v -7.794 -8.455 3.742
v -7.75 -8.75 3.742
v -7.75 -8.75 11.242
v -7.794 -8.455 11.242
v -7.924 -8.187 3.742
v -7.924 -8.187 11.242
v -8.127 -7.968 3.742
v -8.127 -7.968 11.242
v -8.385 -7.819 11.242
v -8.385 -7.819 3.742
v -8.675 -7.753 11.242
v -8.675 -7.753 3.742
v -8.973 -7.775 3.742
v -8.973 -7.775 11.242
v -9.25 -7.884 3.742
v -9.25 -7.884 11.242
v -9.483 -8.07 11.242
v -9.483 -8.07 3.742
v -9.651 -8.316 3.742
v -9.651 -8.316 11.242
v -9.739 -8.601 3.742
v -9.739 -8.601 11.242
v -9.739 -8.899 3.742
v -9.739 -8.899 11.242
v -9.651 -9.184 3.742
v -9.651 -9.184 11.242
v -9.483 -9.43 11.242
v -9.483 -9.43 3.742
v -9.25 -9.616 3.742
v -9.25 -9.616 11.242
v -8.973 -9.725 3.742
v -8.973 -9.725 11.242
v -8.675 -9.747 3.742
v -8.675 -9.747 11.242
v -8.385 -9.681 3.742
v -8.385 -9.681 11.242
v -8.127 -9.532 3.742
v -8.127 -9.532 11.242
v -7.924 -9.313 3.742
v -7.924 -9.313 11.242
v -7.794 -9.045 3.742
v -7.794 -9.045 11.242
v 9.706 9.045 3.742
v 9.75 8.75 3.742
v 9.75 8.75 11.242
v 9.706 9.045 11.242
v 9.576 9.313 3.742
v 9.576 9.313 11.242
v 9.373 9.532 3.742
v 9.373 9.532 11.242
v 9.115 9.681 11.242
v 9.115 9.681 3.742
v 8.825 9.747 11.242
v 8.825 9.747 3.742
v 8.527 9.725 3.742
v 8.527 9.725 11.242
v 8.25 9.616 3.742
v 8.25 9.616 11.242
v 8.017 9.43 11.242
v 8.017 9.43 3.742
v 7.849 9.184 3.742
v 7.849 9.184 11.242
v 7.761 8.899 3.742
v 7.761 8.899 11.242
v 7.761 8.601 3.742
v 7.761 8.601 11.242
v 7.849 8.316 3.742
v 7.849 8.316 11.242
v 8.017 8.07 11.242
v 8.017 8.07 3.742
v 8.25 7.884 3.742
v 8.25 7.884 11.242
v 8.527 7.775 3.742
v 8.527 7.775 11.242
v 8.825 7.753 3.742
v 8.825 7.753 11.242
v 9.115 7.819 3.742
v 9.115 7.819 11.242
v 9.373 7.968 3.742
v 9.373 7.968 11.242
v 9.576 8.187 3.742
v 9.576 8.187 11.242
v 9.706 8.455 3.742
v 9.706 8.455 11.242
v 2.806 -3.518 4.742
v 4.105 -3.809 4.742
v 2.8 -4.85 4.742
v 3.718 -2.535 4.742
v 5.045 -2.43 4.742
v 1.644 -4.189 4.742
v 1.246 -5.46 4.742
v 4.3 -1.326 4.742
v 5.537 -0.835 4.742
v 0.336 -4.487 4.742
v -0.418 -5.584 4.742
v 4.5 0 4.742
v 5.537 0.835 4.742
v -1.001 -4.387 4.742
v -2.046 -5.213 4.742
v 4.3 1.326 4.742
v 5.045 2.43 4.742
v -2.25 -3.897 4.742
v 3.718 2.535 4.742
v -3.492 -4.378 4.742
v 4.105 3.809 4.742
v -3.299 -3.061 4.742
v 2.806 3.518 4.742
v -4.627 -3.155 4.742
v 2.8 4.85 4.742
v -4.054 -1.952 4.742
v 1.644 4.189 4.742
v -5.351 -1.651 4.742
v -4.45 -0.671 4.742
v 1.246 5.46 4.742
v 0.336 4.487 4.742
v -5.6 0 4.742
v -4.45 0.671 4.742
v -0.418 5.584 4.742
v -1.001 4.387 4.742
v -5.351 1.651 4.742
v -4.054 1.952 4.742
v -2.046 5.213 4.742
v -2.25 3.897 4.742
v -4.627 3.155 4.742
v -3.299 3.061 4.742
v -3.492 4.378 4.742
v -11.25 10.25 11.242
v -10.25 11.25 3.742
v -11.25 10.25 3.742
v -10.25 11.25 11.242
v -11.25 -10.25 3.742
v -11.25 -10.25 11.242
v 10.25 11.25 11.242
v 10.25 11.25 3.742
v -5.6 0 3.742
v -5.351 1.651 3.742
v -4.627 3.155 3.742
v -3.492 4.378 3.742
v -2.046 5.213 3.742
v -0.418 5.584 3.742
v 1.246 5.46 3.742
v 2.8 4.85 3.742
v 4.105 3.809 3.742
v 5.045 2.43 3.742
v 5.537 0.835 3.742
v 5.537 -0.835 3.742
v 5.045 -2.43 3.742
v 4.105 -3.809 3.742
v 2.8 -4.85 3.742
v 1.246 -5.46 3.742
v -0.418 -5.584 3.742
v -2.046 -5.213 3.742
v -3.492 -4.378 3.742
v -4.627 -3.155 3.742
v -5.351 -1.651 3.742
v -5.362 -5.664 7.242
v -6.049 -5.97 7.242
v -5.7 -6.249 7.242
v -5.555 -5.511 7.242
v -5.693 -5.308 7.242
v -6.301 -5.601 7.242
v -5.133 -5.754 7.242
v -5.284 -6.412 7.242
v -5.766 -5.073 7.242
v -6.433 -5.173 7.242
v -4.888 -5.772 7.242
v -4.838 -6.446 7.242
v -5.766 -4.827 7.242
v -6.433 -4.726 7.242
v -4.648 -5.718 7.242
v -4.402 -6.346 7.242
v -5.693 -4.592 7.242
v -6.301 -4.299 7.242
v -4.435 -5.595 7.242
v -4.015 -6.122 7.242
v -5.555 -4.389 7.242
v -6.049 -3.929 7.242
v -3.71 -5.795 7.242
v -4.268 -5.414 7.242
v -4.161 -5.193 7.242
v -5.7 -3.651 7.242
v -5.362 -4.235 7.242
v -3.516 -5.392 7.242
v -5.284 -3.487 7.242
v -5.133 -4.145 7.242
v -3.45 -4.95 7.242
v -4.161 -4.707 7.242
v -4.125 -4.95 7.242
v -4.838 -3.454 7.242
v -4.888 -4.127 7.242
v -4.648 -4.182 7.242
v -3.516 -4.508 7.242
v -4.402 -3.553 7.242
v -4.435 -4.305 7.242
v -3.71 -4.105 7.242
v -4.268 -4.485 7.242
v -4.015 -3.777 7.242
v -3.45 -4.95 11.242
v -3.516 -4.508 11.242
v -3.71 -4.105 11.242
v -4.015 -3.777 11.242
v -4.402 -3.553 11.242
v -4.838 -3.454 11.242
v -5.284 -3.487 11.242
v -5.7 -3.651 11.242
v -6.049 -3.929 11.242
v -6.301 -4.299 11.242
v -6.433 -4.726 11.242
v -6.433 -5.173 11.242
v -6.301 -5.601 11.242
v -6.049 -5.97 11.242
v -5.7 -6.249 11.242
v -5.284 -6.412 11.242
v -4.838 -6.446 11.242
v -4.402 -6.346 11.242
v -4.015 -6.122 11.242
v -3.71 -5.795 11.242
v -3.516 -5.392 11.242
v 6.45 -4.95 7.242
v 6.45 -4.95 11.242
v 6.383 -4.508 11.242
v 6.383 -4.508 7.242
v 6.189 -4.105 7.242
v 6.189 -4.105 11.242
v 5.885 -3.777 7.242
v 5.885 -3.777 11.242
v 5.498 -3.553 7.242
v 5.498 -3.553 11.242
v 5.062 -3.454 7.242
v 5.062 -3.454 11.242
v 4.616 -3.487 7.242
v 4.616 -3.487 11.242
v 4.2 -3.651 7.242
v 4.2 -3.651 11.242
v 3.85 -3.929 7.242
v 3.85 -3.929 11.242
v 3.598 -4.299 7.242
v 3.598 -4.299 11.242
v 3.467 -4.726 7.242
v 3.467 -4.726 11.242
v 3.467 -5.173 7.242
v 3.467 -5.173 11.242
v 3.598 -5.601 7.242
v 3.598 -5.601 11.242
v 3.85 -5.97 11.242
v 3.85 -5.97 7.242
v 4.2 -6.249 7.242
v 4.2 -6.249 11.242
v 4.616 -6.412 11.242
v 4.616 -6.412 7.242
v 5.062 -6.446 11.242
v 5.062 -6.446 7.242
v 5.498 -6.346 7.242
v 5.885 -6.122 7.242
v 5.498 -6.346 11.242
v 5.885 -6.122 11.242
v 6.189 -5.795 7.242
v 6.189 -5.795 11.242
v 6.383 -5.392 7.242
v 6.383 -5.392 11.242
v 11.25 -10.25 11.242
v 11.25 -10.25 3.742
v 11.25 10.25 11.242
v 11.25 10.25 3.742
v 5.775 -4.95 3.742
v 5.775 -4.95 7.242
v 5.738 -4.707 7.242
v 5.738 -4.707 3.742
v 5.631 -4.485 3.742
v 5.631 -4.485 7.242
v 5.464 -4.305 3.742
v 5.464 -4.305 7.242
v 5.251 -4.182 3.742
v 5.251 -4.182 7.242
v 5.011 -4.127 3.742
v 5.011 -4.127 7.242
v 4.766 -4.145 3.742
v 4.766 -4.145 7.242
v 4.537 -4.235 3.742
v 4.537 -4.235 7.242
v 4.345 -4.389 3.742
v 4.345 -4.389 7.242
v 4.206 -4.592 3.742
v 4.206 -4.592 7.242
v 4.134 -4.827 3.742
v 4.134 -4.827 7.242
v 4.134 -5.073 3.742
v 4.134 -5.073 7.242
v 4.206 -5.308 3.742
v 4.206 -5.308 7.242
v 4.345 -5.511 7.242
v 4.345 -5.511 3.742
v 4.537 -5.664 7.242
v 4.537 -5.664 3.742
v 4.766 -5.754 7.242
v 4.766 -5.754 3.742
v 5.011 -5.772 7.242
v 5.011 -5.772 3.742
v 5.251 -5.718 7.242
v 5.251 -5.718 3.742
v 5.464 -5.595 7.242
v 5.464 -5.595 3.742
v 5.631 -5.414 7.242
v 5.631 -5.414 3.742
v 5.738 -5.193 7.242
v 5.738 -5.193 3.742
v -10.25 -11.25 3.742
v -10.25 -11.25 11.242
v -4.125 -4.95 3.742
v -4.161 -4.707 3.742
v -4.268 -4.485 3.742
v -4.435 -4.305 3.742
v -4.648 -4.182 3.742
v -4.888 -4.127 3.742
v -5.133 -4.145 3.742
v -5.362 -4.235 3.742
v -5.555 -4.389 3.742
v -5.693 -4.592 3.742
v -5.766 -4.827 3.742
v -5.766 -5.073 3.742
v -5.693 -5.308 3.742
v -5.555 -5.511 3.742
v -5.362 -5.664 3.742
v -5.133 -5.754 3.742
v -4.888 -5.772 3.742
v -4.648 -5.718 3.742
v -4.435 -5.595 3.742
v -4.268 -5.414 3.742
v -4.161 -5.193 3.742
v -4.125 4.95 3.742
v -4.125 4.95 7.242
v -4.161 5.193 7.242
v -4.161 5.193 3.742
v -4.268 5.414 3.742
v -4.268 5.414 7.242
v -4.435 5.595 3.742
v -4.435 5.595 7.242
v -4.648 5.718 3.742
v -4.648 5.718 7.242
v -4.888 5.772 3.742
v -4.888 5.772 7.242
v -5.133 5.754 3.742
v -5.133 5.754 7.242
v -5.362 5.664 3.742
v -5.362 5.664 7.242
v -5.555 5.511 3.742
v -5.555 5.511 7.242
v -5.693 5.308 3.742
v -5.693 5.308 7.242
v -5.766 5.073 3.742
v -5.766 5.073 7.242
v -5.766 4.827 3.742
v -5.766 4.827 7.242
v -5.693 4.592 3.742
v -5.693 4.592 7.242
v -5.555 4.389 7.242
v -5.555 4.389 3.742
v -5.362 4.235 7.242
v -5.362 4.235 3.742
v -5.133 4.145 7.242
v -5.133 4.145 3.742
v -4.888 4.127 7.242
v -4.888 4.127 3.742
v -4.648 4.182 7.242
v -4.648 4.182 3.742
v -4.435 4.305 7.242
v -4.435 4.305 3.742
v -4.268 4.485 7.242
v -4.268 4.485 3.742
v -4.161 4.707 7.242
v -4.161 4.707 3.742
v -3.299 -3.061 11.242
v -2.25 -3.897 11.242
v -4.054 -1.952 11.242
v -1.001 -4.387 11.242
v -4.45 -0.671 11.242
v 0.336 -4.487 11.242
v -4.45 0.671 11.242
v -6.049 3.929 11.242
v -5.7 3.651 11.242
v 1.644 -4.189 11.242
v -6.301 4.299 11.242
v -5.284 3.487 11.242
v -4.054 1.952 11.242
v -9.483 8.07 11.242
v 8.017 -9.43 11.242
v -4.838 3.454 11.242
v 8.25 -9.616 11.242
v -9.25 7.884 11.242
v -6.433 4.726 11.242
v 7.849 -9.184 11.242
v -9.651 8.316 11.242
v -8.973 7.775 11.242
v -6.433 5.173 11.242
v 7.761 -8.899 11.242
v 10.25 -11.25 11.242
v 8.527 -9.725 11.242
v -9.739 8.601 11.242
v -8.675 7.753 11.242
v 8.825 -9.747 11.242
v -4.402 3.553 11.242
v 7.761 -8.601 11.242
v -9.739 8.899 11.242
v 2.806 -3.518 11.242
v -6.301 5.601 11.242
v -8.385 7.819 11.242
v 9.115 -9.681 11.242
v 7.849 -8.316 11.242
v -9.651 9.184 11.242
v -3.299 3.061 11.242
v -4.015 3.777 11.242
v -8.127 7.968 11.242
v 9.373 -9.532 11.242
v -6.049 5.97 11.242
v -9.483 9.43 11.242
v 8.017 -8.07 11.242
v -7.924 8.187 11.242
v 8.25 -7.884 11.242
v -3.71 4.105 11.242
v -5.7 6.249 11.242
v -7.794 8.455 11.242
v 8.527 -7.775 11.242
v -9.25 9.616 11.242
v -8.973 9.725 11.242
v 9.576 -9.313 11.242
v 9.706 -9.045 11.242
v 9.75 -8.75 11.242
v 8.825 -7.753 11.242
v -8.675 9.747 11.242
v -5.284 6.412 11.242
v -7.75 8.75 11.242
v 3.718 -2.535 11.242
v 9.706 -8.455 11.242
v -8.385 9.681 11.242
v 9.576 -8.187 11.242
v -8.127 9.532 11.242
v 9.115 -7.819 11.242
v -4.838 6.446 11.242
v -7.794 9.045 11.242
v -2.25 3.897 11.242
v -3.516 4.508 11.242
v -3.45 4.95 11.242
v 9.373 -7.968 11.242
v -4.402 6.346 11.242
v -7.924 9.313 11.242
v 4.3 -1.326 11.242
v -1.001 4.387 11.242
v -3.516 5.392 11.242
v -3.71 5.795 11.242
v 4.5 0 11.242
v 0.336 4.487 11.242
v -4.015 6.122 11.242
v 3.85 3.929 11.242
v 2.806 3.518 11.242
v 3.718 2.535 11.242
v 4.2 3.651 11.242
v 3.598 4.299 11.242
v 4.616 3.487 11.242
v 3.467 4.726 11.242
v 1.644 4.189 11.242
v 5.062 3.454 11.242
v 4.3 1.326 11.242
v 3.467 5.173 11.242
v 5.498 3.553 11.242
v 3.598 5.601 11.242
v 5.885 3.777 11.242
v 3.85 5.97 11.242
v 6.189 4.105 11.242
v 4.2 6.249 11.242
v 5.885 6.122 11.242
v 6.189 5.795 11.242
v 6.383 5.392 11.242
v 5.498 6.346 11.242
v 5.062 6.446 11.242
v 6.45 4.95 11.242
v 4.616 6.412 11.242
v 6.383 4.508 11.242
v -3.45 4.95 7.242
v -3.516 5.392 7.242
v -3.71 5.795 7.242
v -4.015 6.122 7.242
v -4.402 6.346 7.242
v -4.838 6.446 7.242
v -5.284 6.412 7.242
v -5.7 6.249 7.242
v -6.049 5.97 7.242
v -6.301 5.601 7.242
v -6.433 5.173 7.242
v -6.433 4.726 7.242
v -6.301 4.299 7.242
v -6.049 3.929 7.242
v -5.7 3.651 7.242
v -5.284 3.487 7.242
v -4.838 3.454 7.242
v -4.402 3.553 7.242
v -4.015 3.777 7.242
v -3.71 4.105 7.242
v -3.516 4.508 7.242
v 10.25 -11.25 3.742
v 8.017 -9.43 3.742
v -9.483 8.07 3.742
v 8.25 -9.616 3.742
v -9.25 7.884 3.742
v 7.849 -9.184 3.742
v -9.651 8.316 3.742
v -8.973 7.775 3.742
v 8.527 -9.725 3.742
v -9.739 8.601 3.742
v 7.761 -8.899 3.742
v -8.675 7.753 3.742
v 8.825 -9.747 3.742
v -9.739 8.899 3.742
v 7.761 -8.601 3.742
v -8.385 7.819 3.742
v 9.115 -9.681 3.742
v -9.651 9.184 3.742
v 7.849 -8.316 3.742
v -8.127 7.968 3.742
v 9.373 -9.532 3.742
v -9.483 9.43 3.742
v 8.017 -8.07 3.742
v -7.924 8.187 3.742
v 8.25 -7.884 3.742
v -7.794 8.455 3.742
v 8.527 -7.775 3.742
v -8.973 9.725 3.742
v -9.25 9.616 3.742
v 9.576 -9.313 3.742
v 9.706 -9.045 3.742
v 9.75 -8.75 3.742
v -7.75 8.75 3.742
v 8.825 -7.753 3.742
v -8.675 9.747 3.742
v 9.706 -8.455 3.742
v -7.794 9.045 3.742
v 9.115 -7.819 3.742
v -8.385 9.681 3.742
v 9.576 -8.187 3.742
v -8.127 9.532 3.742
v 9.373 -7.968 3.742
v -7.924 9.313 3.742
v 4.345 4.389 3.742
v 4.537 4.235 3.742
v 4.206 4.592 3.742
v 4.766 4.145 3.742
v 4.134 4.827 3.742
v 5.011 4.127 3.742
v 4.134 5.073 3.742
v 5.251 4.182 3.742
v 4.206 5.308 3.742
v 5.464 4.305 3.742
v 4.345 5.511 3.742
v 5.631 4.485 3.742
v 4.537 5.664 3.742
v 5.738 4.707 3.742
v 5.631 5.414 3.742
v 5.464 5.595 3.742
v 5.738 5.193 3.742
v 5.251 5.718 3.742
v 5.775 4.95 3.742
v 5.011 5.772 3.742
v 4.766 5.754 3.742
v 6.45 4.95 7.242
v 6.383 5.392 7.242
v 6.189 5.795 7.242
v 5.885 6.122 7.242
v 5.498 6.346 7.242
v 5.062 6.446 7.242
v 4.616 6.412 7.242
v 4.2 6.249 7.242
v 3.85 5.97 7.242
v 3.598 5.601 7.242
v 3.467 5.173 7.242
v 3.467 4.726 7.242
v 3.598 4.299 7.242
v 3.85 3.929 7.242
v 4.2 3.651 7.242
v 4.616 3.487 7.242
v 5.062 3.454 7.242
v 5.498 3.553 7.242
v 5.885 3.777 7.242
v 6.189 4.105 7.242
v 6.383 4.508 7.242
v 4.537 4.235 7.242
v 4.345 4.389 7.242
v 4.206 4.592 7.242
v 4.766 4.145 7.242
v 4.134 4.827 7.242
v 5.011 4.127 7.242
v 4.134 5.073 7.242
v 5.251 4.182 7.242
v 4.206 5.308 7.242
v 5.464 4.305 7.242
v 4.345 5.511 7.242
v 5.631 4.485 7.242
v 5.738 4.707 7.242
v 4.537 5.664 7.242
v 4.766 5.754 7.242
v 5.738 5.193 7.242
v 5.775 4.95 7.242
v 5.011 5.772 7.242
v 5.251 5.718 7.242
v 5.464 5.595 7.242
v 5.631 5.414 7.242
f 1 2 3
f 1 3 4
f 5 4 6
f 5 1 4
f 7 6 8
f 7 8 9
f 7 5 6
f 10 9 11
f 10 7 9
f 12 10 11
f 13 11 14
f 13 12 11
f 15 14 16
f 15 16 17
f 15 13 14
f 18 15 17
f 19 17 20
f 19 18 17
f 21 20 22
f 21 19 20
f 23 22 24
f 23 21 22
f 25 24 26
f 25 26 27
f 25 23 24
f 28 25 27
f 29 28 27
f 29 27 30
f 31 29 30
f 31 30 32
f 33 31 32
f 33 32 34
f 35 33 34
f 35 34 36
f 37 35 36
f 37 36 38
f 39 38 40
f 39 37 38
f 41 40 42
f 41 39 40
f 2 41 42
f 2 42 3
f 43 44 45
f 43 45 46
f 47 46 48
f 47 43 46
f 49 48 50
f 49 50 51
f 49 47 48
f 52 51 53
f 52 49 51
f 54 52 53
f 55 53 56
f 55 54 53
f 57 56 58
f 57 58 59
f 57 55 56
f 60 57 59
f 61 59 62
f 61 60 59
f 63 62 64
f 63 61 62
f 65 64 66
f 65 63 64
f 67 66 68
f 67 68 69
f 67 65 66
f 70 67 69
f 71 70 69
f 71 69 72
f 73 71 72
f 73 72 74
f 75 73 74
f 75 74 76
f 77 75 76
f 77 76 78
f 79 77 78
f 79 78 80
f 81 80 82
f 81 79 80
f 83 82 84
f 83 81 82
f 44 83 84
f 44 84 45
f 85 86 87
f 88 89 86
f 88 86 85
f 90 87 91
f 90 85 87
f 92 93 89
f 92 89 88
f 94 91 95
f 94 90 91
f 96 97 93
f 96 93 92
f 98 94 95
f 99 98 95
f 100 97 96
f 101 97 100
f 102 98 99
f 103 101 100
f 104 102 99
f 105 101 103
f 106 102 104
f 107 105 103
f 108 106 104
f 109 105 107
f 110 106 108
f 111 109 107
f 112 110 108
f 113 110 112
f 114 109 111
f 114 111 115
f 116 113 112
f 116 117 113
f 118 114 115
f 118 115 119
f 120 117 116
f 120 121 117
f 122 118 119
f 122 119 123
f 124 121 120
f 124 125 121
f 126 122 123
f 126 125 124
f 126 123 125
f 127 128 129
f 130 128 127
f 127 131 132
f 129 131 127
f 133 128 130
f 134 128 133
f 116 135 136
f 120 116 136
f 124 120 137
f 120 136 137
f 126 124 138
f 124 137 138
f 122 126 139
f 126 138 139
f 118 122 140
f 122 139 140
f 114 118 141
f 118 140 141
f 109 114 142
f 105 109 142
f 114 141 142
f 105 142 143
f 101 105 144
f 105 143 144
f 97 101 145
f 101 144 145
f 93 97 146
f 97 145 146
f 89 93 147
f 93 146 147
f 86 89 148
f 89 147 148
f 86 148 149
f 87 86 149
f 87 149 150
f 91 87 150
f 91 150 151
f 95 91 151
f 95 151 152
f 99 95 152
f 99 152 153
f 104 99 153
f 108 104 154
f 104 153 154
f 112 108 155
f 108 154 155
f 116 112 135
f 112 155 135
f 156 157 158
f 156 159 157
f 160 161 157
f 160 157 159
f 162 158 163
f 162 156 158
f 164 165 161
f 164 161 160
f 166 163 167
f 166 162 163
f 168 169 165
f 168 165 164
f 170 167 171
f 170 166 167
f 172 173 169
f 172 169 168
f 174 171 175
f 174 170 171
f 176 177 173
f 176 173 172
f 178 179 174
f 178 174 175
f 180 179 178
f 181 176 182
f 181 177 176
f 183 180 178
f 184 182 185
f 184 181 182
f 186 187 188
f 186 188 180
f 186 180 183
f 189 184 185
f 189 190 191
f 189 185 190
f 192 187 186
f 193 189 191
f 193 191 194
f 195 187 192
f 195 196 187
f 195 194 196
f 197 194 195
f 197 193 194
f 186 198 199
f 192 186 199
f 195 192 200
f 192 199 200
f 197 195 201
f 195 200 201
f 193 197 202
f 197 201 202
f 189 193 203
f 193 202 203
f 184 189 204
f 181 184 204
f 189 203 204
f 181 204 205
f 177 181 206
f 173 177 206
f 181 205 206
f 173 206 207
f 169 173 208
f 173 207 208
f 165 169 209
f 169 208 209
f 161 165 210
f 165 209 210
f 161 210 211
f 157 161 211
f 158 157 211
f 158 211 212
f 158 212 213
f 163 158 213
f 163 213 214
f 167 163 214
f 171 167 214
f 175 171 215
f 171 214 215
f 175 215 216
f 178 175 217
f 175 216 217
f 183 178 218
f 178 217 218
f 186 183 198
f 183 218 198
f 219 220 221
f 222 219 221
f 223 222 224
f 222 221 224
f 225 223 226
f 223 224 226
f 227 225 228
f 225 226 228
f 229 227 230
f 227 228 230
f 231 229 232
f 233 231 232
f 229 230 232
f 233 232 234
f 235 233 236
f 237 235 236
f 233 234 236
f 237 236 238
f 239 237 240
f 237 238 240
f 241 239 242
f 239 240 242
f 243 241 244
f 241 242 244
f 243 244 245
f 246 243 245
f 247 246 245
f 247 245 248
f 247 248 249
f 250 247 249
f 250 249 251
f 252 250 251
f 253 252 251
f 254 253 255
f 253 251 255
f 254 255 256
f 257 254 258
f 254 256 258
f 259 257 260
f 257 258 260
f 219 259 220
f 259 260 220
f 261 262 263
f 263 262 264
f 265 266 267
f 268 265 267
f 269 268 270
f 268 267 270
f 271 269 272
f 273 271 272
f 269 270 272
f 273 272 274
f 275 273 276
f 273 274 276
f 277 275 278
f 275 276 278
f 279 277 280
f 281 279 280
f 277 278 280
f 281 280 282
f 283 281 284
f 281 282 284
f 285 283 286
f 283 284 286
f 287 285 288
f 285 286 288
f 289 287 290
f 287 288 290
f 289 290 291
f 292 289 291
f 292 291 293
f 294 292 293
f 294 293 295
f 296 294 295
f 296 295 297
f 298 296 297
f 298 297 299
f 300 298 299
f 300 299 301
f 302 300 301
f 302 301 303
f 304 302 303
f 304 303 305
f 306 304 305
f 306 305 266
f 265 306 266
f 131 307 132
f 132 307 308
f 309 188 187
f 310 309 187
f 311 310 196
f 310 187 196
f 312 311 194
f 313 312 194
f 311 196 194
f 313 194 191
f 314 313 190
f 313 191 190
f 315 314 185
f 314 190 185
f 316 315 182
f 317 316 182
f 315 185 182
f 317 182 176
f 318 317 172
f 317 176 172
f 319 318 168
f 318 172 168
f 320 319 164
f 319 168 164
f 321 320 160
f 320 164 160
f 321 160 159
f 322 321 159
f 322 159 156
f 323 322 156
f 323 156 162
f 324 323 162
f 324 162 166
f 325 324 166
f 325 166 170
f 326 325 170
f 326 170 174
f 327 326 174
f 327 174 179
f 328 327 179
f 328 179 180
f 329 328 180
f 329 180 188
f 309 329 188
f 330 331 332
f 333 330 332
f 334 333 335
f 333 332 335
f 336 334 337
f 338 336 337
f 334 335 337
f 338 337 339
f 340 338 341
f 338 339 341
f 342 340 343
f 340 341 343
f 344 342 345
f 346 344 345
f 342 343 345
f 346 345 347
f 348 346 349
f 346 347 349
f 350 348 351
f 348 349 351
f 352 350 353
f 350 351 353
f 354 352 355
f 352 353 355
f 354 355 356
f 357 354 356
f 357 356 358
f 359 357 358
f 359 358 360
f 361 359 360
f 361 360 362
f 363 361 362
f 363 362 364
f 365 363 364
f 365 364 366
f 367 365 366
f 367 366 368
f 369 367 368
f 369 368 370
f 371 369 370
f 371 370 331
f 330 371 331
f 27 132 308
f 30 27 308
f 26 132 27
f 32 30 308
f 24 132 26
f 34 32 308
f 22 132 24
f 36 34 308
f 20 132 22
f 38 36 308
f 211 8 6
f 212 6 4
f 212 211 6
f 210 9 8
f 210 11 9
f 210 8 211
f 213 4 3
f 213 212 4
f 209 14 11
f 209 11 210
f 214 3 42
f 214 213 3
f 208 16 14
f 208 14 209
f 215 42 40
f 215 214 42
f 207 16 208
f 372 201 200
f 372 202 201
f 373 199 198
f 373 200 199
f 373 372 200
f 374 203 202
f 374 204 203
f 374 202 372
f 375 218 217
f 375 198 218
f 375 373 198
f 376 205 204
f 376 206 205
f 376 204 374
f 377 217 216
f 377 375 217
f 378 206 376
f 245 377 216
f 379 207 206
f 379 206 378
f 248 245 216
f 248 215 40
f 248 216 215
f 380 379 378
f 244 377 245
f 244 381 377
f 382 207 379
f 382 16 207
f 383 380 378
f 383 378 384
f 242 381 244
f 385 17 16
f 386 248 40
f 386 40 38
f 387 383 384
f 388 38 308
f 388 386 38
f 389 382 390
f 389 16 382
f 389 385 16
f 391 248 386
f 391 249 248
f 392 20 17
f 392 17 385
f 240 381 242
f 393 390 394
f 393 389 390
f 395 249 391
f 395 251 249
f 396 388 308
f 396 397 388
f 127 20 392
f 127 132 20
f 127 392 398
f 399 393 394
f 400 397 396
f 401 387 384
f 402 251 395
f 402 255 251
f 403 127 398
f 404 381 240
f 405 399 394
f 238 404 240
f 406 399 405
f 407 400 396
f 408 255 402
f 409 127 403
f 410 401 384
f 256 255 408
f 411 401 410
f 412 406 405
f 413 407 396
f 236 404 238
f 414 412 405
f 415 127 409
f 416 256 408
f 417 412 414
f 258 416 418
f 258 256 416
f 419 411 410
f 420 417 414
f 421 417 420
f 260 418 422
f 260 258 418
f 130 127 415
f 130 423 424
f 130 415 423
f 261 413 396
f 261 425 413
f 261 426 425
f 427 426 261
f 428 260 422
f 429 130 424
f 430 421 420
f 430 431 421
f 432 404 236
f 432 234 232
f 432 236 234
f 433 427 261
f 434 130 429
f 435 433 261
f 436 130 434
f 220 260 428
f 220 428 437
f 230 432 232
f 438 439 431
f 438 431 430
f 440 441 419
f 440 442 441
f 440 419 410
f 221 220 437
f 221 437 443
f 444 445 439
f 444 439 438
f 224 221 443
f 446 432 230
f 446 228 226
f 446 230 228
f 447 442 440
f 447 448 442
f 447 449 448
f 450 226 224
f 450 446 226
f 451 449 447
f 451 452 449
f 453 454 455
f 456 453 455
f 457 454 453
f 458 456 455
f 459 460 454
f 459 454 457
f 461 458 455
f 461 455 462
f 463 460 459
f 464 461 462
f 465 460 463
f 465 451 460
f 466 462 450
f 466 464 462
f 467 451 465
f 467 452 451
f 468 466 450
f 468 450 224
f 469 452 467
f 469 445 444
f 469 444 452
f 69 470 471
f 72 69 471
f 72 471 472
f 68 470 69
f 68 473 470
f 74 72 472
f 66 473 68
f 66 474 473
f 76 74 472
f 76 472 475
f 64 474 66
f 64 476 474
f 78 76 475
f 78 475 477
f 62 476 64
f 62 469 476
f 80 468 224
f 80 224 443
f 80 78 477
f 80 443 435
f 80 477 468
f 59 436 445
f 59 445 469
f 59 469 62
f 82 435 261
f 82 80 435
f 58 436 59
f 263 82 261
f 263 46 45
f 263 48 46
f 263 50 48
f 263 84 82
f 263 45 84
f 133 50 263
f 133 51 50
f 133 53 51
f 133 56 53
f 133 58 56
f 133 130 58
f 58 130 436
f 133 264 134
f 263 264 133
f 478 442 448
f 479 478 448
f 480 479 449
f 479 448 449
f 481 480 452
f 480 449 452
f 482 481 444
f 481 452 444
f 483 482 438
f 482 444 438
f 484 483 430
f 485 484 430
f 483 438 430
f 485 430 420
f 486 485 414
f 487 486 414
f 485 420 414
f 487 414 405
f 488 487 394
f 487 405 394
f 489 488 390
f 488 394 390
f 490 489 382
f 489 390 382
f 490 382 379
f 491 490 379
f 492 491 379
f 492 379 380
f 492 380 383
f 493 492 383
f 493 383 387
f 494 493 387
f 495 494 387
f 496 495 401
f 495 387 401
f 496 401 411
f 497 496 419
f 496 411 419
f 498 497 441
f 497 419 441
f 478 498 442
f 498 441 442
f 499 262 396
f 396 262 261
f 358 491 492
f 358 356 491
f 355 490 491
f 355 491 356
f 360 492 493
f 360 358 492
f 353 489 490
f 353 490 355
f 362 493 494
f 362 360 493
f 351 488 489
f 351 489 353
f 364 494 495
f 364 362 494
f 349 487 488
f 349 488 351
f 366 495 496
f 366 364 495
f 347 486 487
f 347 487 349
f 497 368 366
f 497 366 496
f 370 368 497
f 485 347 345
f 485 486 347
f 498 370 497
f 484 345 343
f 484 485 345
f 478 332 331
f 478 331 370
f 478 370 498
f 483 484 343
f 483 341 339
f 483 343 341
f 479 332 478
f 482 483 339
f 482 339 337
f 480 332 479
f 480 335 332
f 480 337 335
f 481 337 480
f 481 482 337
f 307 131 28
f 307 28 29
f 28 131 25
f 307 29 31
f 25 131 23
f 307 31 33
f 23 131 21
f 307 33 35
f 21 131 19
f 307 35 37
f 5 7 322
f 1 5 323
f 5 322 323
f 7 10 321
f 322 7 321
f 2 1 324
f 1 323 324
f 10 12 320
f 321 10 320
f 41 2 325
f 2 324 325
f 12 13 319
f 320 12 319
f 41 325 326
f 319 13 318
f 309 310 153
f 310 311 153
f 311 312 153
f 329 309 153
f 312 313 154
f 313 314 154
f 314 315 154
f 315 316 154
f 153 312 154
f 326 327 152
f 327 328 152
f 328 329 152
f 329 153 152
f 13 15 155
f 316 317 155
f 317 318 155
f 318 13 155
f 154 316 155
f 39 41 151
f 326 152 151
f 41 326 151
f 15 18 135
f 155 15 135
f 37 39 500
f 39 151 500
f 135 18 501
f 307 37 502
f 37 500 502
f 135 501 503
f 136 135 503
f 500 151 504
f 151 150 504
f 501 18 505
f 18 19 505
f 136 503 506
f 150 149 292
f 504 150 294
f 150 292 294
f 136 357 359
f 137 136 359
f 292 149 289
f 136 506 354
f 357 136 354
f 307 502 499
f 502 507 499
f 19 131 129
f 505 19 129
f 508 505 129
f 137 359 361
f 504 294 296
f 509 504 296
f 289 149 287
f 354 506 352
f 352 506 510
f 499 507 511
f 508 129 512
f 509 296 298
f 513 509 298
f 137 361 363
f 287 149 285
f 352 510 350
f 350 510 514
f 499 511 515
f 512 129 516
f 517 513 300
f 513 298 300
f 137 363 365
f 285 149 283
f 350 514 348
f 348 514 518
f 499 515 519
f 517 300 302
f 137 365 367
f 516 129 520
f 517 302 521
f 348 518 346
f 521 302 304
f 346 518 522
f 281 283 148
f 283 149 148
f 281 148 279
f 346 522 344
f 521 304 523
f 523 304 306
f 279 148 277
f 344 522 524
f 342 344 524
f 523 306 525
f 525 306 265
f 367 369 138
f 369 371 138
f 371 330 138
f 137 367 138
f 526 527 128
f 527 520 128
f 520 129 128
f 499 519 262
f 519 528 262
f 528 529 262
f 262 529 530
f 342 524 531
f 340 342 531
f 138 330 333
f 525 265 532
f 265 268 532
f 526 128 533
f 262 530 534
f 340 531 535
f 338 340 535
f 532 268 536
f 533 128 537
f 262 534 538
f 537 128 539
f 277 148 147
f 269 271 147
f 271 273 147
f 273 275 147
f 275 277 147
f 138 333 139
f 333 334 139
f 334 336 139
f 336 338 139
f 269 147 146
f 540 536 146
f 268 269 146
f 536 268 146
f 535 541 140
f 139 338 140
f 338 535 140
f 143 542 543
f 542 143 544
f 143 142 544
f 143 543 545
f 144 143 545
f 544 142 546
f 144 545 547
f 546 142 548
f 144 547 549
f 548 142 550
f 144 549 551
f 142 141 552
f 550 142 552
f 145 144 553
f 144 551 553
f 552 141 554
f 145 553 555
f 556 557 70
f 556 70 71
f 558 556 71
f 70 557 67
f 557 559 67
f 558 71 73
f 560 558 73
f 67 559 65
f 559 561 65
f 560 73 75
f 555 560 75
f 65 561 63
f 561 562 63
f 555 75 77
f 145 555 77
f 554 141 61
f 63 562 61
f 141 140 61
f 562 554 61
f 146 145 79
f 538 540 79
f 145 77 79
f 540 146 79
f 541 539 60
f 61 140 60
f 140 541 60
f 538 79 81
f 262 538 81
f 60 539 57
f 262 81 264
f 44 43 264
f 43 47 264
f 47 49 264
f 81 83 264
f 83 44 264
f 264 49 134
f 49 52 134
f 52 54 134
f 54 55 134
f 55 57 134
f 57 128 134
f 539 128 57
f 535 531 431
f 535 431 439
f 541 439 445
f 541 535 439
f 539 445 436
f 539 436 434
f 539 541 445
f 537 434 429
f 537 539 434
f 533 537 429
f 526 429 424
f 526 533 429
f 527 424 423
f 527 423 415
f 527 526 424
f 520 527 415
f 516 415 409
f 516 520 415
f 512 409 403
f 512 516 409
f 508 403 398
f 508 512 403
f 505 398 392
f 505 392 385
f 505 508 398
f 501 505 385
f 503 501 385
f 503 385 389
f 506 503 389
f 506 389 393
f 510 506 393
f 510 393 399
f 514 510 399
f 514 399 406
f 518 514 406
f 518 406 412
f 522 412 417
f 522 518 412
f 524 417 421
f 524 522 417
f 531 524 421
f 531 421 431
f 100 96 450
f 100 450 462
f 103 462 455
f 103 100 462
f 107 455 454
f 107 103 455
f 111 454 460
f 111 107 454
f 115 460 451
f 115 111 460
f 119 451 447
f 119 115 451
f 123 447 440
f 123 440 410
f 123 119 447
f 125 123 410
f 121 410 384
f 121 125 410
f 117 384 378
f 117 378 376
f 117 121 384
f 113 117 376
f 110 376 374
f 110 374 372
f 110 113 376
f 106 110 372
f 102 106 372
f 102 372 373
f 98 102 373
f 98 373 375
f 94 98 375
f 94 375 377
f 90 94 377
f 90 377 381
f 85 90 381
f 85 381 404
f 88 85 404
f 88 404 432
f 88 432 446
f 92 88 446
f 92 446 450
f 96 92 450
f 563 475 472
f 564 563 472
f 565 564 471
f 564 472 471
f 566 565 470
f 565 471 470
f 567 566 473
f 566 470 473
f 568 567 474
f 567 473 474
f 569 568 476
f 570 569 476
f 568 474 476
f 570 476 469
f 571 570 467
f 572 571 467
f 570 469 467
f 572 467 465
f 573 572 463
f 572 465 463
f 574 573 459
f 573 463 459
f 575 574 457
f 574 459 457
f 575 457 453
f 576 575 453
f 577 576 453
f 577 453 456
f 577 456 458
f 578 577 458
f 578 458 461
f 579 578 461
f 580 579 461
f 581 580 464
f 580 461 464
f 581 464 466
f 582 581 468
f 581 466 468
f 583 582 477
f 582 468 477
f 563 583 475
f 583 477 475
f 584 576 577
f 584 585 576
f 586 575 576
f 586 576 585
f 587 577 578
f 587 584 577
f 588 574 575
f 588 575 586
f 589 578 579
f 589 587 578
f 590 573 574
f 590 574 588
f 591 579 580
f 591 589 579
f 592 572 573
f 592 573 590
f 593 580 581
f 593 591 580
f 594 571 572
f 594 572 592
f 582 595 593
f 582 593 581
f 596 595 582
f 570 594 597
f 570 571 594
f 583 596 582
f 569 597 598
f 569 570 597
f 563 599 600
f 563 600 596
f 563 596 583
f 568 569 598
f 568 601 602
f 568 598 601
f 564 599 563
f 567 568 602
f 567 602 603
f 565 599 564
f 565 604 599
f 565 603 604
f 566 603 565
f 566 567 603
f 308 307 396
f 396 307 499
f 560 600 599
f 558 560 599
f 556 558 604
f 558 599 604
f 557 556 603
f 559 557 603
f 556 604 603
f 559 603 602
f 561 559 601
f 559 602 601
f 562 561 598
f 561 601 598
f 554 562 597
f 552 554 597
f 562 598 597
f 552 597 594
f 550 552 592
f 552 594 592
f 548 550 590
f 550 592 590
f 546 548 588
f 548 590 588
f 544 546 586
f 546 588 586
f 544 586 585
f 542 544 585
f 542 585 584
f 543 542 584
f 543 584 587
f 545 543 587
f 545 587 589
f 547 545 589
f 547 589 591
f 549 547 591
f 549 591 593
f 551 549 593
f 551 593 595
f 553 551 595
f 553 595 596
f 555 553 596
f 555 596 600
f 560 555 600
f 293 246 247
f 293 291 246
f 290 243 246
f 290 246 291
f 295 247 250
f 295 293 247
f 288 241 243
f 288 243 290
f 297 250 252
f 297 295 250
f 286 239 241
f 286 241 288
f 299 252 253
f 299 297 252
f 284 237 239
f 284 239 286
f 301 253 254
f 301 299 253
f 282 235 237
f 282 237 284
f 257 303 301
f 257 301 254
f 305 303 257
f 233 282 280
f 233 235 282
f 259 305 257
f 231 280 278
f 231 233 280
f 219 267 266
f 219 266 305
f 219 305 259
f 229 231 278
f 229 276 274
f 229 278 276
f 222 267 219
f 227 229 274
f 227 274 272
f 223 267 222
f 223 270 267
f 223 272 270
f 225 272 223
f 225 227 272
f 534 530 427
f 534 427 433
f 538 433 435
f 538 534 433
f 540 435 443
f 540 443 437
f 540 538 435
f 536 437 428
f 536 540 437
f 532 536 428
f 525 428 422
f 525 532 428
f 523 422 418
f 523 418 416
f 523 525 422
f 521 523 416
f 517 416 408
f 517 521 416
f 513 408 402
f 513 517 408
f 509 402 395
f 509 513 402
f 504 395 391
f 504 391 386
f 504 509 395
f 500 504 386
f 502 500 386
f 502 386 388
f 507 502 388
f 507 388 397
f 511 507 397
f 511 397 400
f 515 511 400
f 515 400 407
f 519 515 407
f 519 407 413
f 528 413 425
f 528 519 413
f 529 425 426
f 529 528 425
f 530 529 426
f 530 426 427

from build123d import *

# Parameters (mm, degrees)
SKETCH1_W           = 45
SKETCH1_H           = 45
SKETCH1_R           = 9
SKETCH1_R_2         = 2
BOSS_EXTRUDE1_DEPTH = 15
SKETCH2_R           = 1.65
CUT_EXTRUDE1_DEPTH  = 15
SKETCH3_R           = 3
CUT_EXTRUDE2_DEPTH  = 8
CHAMFER1_SIZE       = 2
SKETCH4_R           = 11.2
CUT_EXTRUDE3_DEPTH  = 2
ECHELLE1_SCALE      = 2
ECHELLE2_SCALE      = 0.25


with BuildPart() as part:
    # Sketch1 → Boss-Extrude1 (new body)
    with BuildSketch(Plane.XY):
        Rectangle(SKETCH1_W, SKETCH1_H)
        Circle(SKETCH1_R, mode=Mode.SUBTRACT)
        with Locations((-17.5, 17.5)):
            Circle(SKETCH1_R_2, mode=Mode.SUBTRACT)
        with Locations((17.5, 17.5)):
            Circle(SKETCH1_R_2, mode=Mode.SUBTRACT)
        with Locations((17.5, -17.5)):
            Circle(SKETCH1_R_2, mode=Mode.SUBTRACT)
        with Locations((-17.5, -17.5)):
            Circle(SKETCH1_R_2, mode=Mode.SUBTRACT)
    extrude(amount=BOSS_EXTRUDE1_DEPTH)

    # Sketch2 → Cut-Extrude1 (cut)
    with BuildSketch(Plane.XY.offset(15)):
        with Locations((9.899494937, 9.899494937)):
            Circle(SKETCH2_R)
        with Locations((9.899494937, -9.899494937)):
            Circle(SKETCH2_R)
        with Locations((-9.899494937, -9.899494937)):
            Circle(SKETCH2_R)
        with Locations((-9.899494937, 9.899494937)):
            Circle(SKETCH2_R)
    extrude(amount=-CUT_EXTRUDE1_DEPTH, mode=Mode.SUBTRACT)

    # Sketch3 → Cut-Extrude2 (cut)
    with BuildSketch(Plane.XY.offset(15)):
        with Locations((9.899494937, 9.899494937)):
            Circle(SKETCH3_R)
        with Locations((9.899494937, -9.899494937)):
            Circle(SKETCH3_R)
        with Locations((-9.899494937, -9.899494937)):
            Circle(SKETCH3_R)
        with Locations((-9.899494937, 9.899494937)):
            Circle(SKETCH3_R)
    extrude(amount=-CUT_EXTRUDE2_DEPTH, mode=Mode.SUBTRACT)

    # Chamfer1
    chamfer1_edges = [part.edges().sort_by_distance(p)[0] for p in [
        (22.5, -22.5, 7.5),
        (-22.5, -22.5, 7.5),
        (-22.5, 22.5, 7.5),
        (22.5, 22.5, 7.5),
    ]]
    chamfer(chamfer1_edges, length=CHAMFER1_SIZE)

    # Sketch4 → Cut-Extrude3 (cut)
    with BuildSketch(Plane(origin=(0, 0, 0), x_dir=(-1, 0, 0), z_dir=(0, 0, -1))):
        Circle(SKETCH4_R)
    extrude(amount=-CUT_EXTRUDE3_DEPTH, mode=Mode.SUBTRACT)


with BuildPart() as part_1:
    # Echelle1: scaled about (0, 0, 7.483766611)
    add(part.part.scale(ECHELLE1_SCALE).moved(Location((0, 0, -7.483766611))))


with BuildPart() as part_2:
    # Echelle2: scaled about (0, 0, 7.483766612)
    add(part_1.part.scale(ECHELLE2_SCALE).moved(Location((0, 0, 5.612824959))))


solid = part_2.part
